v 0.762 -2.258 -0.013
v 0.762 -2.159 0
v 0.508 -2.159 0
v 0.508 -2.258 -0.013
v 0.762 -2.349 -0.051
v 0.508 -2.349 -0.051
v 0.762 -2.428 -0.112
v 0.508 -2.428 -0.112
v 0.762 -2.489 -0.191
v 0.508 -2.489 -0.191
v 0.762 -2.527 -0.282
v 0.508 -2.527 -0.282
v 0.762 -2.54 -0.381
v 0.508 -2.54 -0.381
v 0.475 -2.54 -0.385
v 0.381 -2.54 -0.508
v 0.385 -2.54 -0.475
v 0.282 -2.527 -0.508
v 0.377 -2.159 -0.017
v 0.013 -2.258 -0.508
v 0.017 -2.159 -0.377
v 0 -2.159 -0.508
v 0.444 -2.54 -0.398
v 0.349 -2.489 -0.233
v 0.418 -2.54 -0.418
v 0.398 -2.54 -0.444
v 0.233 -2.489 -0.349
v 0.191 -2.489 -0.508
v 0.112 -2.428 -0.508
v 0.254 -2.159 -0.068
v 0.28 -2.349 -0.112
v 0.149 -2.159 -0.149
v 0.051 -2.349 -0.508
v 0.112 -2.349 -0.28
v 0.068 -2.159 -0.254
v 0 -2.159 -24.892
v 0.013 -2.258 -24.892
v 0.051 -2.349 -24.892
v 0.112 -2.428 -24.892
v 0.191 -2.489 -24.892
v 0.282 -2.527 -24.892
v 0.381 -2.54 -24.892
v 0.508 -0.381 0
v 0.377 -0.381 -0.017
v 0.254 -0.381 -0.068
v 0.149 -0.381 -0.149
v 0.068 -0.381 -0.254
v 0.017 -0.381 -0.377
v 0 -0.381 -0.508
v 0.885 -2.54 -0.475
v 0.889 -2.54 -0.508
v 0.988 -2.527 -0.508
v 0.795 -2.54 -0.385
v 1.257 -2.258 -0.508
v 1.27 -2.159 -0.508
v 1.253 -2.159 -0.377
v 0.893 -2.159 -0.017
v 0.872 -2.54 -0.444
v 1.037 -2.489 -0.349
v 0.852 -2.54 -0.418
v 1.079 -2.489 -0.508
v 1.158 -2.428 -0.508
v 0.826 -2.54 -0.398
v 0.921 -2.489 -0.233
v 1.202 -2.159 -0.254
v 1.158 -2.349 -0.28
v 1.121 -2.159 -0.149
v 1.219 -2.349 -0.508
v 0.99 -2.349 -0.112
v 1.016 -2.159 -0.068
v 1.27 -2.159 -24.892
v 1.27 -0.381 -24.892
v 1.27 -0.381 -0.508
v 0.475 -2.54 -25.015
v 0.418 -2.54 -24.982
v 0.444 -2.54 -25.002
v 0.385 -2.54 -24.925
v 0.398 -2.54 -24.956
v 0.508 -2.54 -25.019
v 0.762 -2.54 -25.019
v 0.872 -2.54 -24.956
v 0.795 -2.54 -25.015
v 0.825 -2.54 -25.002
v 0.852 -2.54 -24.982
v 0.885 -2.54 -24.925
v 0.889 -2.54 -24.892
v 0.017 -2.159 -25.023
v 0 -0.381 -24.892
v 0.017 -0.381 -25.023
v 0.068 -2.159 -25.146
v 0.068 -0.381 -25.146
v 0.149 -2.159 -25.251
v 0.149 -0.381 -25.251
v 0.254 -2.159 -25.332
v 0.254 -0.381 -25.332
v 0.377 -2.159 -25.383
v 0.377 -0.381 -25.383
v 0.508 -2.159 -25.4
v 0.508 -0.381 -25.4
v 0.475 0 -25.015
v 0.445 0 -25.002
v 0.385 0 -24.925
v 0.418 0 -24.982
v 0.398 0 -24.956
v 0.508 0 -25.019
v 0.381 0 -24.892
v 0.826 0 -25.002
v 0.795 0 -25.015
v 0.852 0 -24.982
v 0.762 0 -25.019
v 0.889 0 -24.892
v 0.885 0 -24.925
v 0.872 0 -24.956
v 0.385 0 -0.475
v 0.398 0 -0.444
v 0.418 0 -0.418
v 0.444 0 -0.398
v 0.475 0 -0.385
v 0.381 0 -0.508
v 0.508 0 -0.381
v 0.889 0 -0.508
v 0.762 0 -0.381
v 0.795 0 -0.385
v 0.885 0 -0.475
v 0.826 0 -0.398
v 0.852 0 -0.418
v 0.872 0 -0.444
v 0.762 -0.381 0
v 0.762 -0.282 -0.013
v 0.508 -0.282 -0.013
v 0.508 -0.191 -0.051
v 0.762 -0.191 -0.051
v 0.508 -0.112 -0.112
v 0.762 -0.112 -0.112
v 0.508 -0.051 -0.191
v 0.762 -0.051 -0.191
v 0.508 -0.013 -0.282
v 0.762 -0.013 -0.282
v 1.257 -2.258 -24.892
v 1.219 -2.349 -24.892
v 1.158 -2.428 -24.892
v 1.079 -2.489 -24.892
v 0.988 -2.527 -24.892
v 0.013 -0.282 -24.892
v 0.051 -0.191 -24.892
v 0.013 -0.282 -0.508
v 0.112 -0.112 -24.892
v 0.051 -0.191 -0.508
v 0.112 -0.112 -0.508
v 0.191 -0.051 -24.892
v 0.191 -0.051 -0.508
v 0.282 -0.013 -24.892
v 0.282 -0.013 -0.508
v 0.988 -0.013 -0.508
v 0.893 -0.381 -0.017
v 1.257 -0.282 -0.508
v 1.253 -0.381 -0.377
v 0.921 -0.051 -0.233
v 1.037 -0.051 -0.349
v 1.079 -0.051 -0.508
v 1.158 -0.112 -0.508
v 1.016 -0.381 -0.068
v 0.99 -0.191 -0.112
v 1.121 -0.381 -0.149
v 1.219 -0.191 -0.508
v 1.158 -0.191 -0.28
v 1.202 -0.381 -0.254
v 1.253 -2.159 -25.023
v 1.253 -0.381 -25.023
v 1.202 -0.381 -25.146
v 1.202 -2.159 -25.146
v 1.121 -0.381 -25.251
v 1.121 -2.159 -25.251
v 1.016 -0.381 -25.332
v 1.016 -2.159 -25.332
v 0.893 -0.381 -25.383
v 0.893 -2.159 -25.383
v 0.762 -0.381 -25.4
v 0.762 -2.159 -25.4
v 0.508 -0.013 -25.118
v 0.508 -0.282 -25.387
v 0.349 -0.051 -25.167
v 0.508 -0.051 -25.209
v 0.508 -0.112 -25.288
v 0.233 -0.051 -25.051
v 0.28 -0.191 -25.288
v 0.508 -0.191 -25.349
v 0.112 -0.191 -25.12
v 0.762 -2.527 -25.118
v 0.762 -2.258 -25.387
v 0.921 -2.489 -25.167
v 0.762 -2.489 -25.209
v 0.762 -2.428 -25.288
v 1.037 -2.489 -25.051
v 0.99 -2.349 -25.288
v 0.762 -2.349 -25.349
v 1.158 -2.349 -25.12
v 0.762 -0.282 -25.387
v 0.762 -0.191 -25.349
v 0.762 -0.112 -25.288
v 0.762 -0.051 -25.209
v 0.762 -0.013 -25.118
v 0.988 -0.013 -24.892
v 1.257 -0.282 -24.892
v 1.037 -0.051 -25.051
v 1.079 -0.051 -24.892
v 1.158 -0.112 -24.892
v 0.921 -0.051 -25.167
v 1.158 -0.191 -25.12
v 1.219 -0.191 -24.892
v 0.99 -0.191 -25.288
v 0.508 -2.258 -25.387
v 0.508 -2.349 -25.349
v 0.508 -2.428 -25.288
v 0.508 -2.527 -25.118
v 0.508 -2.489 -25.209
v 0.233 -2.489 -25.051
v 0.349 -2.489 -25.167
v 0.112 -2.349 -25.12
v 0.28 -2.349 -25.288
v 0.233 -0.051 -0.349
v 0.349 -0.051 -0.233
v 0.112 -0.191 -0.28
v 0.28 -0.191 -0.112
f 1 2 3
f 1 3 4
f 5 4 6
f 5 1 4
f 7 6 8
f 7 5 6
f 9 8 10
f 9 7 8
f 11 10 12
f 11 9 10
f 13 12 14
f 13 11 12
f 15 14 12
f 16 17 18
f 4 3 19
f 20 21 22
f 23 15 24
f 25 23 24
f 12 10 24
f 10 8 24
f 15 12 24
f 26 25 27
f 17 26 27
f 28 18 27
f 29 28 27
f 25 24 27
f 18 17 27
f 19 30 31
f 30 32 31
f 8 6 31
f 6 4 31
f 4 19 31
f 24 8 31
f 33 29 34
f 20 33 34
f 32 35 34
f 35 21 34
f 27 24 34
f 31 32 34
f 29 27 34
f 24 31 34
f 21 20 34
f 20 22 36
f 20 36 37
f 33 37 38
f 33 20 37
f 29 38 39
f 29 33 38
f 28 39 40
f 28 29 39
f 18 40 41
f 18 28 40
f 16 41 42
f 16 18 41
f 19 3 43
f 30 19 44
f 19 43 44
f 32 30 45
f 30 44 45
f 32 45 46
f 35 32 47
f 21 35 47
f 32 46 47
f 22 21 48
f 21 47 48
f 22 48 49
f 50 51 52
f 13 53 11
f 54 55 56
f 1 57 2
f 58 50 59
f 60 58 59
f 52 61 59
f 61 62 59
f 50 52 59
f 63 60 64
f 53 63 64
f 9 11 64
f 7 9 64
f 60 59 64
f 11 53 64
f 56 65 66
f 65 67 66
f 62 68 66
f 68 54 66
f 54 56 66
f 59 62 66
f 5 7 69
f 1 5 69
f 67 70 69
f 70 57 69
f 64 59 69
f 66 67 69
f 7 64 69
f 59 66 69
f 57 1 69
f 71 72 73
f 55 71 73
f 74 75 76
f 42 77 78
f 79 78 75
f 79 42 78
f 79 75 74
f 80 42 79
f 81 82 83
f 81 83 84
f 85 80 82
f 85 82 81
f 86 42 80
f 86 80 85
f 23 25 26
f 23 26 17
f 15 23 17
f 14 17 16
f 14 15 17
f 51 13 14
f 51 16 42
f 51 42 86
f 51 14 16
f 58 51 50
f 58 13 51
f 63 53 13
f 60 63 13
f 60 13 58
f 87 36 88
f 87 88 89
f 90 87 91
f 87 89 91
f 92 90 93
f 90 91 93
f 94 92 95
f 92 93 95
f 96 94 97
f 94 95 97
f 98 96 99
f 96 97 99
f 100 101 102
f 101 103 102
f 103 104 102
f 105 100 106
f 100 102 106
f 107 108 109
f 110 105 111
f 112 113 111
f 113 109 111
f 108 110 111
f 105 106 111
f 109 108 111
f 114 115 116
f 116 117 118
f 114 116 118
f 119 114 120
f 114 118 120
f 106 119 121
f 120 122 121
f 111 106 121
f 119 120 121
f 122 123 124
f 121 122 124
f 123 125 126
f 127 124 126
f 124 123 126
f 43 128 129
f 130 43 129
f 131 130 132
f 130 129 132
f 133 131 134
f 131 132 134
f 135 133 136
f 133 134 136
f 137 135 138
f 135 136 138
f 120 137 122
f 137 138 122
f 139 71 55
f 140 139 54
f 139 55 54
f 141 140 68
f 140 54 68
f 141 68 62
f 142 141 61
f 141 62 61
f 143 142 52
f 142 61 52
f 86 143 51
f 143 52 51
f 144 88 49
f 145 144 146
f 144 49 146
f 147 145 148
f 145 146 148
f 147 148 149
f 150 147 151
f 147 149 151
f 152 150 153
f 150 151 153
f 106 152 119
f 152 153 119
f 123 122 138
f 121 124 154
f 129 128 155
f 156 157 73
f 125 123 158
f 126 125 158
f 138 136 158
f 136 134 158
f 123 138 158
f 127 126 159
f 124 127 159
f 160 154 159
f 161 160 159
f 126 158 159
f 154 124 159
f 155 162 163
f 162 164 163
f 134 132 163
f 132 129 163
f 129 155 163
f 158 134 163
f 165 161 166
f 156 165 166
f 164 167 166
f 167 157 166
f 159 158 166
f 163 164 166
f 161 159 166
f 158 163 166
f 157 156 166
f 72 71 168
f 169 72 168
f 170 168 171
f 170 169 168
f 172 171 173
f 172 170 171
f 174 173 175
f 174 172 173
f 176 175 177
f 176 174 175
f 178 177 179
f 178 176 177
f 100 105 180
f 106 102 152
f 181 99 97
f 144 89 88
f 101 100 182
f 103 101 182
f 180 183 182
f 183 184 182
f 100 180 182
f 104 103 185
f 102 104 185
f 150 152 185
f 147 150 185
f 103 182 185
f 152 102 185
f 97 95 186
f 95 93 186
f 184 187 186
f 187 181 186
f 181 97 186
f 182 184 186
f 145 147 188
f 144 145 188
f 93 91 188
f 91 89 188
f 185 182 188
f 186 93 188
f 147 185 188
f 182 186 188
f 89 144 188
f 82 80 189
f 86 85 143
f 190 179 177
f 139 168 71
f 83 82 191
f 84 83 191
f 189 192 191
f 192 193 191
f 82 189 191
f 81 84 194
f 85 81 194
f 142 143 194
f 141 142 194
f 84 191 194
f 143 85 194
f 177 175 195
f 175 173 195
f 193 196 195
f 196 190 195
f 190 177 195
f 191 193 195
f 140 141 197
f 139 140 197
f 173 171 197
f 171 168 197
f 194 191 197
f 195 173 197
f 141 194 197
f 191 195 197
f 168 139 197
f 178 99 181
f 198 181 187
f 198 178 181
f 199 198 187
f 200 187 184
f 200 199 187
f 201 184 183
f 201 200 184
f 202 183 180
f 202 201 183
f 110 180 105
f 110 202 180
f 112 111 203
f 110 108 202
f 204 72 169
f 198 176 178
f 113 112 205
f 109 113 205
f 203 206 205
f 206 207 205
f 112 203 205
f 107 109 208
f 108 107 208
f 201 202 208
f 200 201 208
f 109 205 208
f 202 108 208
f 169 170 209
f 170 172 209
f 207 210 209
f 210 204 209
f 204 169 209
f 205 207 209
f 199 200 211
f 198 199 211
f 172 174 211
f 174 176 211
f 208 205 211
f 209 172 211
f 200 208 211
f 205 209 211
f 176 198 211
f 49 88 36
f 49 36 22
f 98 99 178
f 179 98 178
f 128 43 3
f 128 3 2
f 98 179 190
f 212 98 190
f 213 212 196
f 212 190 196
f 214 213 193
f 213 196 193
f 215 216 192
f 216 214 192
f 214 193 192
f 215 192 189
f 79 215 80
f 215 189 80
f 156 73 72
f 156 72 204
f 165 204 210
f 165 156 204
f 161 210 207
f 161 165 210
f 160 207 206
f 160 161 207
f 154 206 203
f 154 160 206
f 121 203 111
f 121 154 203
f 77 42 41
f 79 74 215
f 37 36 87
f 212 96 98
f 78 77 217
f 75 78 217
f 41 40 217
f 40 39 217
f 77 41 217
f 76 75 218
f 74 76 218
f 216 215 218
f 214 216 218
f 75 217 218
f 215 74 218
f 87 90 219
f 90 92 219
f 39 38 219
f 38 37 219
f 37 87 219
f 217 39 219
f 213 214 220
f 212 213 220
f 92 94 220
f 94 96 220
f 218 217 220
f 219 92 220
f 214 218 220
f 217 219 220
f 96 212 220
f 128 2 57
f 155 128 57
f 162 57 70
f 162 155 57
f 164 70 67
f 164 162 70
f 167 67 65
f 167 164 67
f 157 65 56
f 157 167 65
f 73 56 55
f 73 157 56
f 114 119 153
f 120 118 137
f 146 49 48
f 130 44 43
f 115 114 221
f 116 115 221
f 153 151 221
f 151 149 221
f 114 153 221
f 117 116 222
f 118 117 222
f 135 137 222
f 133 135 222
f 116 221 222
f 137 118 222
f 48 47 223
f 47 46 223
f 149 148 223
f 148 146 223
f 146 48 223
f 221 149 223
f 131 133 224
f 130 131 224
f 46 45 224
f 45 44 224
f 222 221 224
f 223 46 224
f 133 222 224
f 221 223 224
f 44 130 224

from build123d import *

# Parameters (mm, degrees)
F0_W         = 1.27
F0_H         = 25.4
F2_DEPTH     = 2.54
F3_R         = 0.381
F1_T1_DEPTH  = 2.54
F1_T4_ANGLE  = 90
F1_T6_ANGLE  = 90
F1_T8_ANGLE  = 90
F1_T10_ANGLE = 90
F1_T12_ANGLE = 90
F1_T14_ANGLE = 90
F1_T16_ANGLE = 90
F1_T18_ANGLE = 90


# Not quite as in the source:
# - a fillet or chamfer that OpenCascade refuses, or shapes differently, is made with other operations: its cross-section is extruded or revolved along the edge and cut away or added


with BuildPart() as f2:
    # F0 (on Front) → F2 (new body)
    with BuildSketch(Plane.XZ):
        with Locations((0.635, -12.7)):
            Rectangle(F0_W, F0_H)
    extrude(amount=F2_DEPTH)

    # F3
    f3_edges = [f2.edges().sort_by_distance(p)[0] for p in [
        (0.635, -2.54, 0),
        (0, -2.54, -12.7),
        (0.635, -2.54, -25.4),
        (1.27, -2.54, -12.7),
        (1.27, 0, -12.7),
        (0.635, 0, 0),
        (0, 0, -12.7),
        (0.635, 0, -25.4),
    ]]
    fillet(f3_edges, radius=F3_R)

    # F1: fillet of radius 0.508 on 4 edges, made by hand

    # F1_s2 → F1_t1 (cut)
    with BuildSketch(Plane.XZ):
        with BuildLine():
            ThreePointArc((0, -24.892), (0.1487897552, -25.2512102448), (0.508, -25.4))
            Line((0.508, -25.4), (0, -25.4))
            Line((0, -25.4), (0, -24.892))
        make_face()
        with BuildLine():
            ThreePointArc((1.27, -24.892), (1.1212102448, -25.2512102448), (0.762, -25.4))
            Line((0.762, -25.4), (1.27, -25.4))
            Line((1.27, -25.4), (1.27, -24.892))
        make_face()
        with BuildLine():
            ThreePointArc((0.508, 0), (0.1487897552, -0.1487897552), (0, -0.508))
            Line((0, -0.508), (0, 0))
            Line((0, 0), (0.508, 0))
        make_face()
        with BuildLine():
            ThreePointArc((0.762, 0), (1.1212102448, -0.1487897552), (1.27, -0.508))
            Line((1.27, -0.508), (1.27, 0))
            Line((1.27, 0), (0.762, 0))
        make_face()
    extrude(amount=F1_T1_DEPTH, mode=Mode.SUBTRACT)

    # F1_s3 → F1_t4 (revolve, cut)
    with BuildSketch(Plane.YZ.offset(0.762)):
        with BuildLine():
            ThreePointArc((0, -0.381), (-0.1115923164, -0.1115923164), (-0.381, 0))
            Line((-0.381, 0), (0, 0))
            Line((0, 0), (0, -0.381))
        make_face()
    revolve(axis=Axis((0.762, 0, -0.508), (0, 1, 0)), revolution_arc=F1_T4_ANGLE, mode=Mode.SUBTRACT)

    # F1_s5 → F1_t6 (revolve, cut)
    with BuildSketch(Plane.XY.offset(-0.508)):
        with BuildLine():
            ThreePointArc((0.889, -2.54), (1.1584076836, -2.4284076836), (1.27, -2.159))
            Line((1.27, -2.159), (1.27, -2.54))
            Line((1.27, -2.54), (0.889, -2.54))
        make_face()
    revolve(axis=Axis((0.762, -2.54, -0.508), (0, -1, 0)), revolution_arc=F1_T6_ANGLE, mode=Mode.SUBTRACT)

    # F1_s7 → F1_t8 (revolve, cut)
    with BuildSketch(Plane.XY.offset(-0.508)):
        with BuildLine():
            ThreePointArc((0.381, 0), (0.1115923164, -0.1115923164), (0, -0.381))
            Line((0, -0.381), (0, 0))
            Line((0, 0), (0.381, 0))
        make_face()
    revolve(axis=Axis((0.508, 0, -0.508), (0, 1, 0)), revolution_arc=F1_T8_ANGLE, mode=Mode.SUBTRACT)

    # F1_s9 → F1_t10 (revolve, cut)
    with BuildSketch(Plane.YZ.offset(0.508)):
        with BuildLine():
            ThreePointArc((-2.54, -0.381), (-2.4284076836, -0.1115923164), (-2.159, 0))
            Line((-2.159, 0), (-2.54, 0))
            Line((-2.54, 0), (-2.54, -0.381))
        make_face()
    revolve(axis=Axis((0.508, -2.54, -0.508), (0, -1, 0)), revolution_arc=F1_T10_ANGLE, mode=Mode.SUBTRACT)

    # F1_s11 → F1_t12 (revolve, cut)
    with BuildSketch(Plane.XY.offset(-24.892)):
        with BuildLine():
            ThreePointArc((0.889, 0), (1.1584076836, -0.1115923164), (1.27, -0.381))
            Line((1.27, -0.381), (1.27, 0))
            Line((1.27, 0), (0.889, 0))
        make_face()
    revolve(axis=Axis((0.762, 0, -24.892), (0, 1, 0)), revolution_arc=F1_T12_ANGLE, mode=Mode.SUBTRACT)

    # F1_s13 → F1_t14 (revolve, cut)
    with BuildSketch(Plane.YZ.offset(0.762)):
        with BuildLine():
            ThreePointArc((-2.54, -25.019), (-2.4284076836, -25.2884076836), (-2.159, -25.4))
            Line((-2.159, -25.4), (-2.54, -25.4))
            Line((-2.54, -25.4), (-2.54, -25.019))
        make_face()
    revolve(axis=Axis((0.762, -2.54, -24.892), (0, -1, 0)), revolution_arc=F1_T14_ANGLE, mode=Mode.SUBTRACT)

    # F1_s15 → F1_t16 (revolve, cut)
    with BuildSketch(Plane.YZ.offset(0.508)):
        with BuildLine():
            ThreePointArc((0, -25.019), (-0.1115923164, -25.2884076836), (-0.381, -25.4))
            Line((-0.381, -25.4), (0, -25.4))
            Line((0, -25.4), (0, -25.019))
        make_face()
    revolve(axis=Axis((0.508, 0, -24.892), (0, 1, 0)), revolution_arc=F1_T16_ANGLE, mode=Mode.SUBTRACT)

    # F1_s17 → F1_t18 (revolve, cut)
    with BuildSketch(Plane.XY.offset(-24.892)):
        with BuildLine():
            ThreePointArc((0.381, -2.54), (0.1115923164, -2.4284076836), (0, -2.159))
            Line((0, -2.159), (0, -2.54))
            Line((0, -2.54), (0.381, -2.54))
        make_face()
    revolve(axis=Axis((0.508, -2.54, -24.892), (0, -1, 0)), revolution_arc=F1_T18_ANGLE, mode=Mode.SUBTRACT)


solid = f2.part
